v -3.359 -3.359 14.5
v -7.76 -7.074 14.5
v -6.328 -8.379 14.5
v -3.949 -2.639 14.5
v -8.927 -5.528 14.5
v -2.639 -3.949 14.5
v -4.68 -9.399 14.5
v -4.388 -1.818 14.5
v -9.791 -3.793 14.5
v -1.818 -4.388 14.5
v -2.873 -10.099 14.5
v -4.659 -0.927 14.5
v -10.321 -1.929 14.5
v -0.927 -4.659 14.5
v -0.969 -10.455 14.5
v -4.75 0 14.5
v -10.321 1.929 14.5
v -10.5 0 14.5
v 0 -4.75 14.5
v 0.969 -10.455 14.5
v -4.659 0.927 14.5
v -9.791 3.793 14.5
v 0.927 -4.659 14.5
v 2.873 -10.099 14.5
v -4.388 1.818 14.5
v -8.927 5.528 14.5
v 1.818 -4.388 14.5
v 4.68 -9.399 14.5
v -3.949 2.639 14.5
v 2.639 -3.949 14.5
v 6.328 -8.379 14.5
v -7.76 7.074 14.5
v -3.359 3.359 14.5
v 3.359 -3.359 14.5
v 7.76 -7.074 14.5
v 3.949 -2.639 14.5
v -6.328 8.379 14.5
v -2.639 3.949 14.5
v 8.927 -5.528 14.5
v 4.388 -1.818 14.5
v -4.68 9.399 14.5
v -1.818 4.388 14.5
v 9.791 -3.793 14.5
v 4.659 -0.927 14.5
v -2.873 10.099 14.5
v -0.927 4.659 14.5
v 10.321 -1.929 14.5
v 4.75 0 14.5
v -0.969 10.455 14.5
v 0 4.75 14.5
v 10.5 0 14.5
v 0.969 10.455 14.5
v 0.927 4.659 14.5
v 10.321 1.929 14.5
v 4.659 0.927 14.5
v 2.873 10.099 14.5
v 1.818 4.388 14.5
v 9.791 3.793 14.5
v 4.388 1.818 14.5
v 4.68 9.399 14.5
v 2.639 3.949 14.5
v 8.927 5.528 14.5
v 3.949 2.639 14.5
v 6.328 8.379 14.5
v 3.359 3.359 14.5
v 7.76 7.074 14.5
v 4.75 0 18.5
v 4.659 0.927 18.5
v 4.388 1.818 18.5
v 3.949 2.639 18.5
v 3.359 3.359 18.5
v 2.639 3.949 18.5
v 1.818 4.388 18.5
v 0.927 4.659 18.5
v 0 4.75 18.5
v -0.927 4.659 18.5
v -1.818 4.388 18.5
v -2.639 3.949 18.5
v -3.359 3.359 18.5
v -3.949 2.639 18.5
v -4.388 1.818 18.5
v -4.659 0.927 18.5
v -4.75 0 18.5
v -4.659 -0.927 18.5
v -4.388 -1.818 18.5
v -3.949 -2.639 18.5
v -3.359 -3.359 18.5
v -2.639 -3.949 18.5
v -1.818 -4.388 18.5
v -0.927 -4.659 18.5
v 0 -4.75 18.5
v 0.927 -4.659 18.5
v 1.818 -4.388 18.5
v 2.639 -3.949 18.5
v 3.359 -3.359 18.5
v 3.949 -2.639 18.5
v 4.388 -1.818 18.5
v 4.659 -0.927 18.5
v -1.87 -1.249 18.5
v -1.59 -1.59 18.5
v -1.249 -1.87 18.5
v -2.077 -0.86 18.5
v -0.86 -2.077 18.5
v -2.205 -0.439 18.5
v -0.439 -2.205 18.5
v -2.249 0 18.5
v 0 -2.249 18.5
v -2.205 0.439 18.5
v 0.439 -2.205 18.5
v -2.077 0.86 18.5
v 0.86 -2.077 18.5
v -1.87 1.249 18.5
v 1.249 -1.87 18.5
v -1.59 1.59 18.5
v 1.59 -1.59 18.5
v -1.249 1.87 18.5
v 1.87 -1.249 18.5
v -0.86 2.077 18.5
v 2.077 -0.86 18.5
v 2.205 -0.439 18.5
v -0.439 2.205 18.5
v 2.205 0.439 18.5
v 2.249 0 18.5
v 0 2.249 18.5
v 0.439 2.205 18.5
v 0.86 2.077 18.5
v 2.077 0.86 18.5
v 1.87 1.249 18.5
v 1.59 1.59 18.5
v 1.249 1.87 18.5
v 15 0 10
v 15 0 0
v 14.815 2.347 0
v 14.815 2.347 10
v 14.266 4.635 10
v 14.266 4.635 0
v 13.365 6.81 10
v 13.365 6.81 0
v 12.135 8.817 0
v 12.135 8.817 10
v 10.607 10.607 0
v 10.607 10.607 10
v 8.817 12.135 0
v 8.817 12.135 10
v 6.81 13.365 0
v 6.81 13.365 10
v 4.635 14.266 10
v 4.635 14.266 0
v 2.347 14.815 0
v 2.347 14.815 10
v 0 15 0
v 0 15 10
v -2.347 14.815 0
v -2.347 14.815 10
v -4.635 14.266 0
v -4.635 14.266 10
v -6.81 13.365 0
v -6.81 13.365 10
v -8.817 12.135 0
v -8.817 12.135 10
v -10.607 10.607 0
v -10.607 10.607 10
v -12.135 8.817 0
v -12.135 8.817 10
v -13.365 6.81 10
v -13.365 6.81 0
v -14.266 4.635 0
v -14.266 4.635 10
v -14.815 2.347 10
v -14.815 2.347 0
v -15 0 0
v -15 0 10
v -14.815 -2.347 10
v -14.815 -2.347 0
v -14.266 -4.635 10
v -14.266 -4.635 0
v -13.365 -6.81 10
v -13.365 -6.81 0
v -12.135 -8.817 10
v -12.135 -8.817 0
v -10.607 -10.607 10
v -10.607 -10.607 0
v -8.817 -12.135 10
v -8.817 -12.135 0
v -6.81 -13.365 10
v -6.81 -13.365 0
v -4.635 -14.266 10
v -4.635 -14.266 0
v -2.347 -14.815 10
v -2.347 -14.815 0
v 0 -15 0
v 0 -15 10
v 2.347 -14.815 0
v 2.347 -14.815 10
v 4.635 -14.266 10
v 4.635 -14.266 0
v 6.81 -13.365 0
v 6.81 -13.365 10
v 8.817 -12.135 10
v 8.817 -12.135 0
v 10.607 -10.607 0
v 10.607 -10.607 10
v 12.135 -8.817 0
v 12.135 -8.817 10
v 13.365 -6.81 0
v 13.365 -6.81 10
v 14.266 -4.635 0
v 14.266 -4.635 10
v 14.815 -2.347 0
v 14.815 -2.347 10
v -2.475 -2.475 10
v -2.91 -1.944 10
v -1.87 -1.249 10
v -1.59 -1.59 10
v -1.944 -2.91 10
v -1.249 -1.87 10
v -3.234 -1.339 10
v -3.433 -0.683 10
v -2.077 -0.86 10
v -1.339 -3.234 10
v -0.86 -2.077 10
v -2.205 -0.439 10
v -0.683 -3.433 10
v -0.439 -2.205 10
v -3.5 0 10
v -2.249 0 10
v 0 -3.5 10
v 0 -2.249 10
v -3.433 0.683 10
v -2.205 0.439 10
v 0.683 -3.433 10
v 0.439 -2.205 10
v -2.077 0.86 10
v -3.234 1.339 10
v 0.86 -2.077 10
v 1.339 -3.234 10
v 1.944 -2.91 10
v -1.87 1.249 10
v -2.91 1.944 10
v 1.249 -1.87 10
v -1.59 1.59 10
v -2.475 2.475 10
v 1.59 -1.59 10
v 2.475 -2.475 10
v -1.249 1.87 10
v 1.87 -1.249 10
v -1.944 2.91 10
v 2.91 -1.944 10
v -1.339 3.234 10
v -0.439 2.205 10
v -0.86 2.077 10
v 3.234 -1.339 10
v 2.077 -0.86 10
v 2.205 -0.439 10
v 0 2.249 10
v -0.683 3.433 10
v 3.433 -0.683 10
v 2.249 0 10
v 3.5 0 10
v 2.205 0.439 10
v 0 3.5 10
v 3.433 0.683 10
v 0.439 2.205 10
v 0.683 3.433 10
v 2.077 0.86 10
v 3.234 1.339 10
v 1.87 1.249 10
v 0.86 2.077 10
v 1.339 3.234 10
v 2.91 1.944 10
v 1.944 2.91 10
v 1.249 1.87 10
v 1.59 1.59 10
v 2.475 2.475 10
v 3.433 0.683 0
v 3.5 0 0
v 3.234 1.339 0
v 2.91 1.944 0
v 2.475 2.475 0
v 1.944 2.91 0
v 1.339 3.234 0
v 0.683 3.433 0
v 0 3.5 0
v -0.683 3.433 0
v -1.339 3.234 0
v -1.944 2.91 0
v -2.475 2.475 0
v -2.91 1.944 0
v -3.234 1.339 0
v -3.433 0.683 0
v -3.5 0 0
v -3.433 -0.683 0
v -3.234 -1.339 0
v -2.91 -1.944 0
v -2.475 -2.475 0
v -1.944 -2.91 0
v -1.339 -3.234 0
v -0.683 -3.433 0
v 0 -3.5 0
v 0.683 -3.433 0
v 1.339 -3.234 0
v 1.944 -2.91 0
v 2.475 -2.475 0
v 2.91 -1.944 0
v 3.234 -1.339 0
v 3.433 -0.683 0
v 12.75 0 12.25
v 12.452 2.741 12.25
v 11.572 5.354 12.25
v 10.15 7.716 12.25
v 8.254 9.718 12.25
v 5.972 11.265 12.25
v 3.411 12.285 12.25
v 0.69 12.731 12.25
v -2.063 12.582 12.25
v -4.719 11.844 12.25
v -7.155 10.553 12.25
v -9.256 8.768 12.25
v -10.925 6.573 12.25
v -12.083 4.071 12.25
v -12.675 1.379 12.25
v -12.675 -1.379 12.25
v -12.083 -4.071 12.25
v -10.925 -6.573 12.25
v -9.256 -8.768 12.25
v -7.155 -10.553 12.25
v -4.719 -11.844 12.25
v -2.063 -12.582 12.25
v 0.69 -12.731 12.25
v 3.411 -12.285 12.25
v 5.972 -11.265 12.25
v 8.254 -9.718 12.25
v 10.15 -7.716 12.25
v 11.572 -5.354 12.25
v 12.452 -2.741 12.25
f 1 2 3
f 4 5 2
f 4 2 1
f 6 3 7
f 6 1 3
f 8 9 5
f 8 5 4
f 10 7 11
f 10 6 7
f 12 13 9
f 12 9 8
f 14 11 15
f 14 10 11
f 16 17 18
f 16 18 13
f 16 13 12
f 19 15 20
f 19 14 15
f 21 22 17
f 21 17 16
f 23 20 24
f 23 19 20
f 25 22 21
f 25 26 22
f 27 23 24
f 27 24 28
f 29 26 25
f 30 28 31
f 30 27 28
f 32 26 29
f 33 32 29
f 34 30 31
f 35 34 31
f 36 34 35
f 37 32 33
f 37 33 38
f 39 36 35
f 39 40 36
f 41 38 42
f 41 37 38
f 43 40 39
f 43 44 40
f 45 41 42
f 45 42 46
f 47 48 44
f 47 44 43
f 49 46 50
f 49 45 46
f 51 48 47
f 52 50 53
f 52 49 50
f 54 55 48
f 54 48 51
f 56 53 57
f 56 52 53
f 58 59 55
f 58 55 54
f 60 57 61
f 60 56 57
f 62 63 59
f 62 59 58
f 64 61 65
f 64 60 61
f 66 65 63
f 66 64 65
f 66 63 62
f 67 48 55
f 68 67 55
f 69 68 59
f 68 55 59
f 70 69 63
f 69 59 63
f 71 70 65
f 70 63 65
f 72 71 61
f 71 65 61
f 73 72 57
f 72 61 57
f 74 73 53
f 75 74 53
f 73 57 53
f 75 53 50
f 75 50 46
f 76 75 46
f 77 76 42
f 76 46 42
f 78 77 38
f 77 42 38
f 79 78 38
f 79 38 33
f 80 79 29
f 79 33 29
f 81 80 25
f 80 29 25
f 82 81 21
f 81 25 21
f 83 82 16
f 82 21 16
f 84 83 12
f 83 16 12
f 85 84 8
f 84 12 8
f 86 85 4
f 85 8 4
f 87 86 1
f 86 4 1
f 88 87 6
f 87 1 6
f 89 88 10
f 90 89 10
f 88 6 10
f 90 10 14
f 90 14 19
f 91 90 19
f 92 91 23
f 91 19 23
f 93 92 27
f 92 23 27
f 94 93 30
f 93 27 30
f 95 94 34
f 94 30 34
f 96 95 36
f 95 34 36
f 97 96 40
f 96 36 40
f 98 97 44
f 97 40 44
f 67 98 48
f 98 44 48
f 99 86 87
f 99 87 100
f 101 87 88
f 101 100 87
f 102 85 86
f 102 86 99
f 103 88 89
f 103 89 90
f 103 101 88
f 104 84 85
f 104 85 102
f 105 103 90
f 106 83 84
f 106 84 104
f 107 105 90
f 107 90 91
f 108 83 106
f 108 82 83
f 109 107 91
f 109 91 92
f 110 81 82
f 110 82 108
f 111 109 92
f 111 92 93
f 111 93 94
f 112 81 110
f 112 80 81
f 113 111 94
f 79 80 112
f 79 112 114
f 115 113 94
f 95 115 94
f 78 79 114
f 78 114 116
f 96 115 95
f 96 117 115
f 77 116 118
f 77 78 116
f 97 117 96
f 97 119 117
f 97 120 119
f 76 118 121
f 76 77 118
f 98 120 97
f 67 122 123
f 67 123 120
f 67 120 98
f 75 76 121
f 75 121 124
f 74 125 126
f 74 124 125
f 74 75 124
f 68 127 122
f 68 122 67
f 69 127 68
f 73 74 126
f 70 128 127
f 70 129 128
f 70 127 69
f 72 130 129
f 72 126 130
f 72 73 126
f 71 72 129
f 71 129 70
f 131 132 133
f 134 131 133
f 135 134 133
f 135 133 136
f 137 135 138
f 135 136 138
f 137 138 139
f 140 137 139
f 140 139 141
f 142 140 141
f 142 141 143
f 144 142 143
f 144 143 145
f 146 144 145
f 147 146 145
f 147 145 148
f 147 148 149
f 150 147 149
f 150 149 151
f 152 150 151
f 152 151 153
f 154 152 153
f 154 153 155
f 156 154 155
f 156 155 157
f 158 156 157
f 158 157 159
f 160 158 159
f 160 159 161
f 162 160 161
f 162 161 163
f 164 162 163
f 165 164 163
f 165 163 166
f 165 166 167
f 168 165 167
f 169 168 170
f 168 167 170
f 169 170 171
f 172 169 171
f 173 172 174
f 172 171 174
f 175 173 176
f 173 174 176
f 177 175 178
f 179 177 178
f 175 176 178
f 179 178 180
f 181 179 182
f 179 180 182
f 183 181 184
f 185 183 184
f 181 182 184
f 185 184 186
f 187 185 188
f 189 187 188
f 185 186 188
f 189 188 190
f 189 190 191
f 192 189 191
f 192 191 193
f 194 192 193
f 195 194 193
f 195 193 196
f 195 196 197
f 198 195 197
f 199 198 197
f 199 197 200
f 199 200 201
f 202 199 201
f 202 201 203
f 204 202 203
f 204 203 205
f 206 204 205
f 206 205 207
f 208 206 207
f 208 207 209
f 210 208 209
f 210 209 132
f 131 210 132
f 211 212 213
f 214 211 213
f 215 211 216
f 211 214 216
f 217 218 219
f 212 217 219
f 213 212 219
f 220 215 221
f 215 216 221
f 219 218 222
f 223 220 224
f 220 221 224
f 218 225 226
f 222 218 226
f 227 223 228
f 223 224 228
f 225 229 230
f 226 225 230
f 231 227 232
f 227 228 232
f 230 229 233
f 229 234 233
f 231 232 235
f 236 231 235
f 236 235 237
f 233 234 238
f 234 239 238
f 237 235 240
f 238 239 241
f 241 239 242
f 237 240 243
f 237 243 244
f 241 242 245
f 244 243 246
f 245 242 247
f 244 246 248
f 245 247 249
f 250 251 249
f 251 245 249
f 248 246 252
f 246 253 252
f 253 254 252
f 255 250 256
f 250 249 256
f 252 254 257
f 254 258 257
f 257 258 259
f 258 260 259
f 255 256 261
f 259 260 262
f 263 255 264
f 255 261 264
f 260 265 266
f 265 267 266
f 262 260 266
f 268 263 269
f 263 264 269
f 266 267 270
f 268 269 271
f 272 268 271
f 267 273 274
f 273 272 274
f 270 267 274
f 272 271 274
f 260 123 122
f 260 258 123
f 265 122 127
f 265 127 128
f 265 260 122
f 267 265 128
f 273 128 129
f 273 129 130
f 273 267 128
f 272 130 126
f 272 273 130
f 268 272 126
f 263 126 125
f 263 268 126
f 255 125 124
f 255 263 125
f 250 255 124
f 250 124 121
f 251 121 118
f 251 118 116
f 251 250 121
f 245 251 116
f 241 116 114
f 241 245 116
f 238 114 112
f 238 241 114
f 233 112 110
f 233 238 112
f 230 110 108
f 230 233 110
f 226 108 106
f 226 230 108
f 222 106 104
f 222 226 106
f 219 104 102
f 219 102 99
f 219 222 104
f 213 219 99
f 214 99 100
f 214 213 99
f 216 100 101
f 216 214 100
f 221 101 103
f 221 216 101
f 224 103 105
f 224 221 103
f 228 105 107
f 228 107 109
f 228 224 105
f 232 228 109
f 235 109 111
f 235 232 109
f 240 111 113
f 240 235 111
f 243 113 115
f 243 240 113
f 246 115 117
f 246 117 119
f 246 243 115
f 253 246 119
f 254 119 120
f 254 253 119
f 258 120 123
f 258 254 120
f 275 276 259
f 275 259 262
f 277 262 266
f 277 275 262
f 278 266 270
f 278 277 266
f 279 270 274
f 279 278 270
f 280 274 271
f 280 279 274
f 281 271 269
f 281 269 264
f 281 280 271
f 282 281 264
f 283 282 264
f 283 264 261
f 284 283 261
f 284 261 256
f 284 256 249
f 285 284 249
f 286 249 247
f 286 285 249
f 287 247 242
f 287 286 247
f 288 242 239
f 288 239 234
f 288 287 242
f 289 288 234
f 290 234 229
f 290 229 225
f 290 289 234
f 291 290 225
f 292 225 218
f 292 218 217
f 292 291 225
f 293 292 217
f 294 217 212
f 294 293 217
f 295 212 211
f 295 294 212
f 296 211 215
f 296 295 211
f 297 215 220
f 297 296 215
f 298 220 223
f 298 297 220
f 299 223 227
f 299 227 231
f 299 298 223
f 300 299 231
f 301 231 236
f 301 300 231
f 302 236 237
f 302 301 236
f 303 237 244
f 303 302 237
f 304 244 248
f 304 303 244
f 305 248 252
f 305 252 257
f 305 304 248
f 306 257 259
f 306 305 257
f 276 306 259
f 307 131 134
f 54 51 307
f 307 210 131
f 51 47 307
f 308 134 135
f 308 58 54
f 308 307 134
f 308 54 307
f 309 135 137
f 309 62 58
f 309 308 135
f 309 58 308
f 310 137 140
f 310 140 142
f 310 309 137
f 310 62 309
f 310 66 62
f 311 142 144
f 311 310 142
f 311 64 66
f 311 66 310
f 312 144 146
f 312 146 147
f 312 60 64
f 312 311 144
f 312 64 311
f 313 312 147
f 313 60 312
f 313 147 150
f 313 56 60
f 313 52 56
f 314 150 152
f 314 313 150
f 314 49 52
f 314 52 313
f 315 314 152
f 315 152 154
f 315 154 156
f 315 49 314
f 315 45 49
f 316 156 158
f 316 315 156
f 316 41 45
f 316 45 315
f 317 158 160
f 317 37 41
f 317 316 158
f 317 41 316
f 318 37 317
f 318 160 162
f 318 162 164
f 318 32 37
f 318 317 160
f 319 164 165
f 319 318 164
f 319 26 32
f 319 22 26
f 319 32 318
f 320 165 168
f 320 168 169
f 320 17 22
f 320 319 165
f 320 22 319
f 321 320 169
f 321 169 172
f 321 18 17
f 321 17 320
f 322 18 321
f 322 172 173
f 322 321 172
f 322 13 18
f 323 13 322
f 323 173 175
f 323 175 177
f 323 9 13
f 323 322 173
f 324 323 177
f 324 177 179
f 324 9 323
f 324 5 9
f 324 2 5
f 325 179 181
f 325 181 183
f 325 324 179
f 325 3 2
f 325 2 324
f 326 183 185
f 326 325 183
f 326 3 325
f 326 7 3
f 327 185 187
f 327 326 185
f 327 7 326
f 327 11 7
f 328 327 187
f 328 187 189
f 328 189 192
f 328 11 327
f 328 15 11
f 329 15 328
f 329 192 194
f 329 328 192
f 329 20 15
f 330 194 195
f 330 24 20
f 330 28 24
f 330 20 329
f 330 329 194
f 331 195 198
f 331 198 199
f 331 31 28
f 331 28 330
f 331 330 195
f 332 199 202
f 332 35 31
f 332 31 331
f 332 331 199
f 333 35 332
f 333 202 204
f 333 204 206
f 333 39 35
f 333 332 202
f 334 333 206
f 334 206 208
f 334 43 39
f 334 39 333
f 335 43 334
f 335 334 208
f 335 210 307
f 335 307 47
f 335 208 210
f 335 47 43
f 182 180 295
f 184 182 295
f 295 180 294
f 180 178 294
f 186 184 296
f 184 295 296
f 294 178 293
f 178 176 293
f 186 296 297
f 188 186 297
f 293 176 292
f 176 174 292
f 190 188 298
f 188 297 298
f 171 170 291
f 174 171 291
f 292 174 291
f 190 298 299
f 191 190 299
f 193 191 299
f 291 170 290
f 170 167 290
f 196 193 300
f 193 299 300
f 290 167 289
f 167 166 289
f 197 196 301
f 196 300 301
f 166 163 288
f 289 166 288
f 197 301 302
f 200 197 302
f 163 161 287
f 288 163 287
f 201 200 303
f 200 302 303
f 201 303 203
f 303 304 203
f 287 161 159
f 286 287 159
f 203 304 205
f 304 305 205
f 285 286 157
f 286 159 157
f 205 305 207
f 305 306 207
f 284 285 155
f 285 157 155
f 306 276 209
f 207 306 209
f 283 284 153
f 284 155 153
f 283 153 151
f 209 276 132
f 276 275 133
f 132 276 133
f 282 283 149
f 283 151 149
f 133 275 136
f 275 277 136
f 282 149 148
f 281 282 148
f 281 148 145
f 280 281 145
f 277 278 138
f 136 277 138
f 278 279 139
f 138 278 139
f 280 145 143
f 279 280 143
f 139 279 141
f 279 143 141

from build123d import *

# Parameters (mm, degrees)
F0_R      = 15
F1_DEPTH  = 10
F2_R      = 15
F3_DEPTH  = 4.5
F4_SIZE2  = 4.5
F4_SIZE   = 4.5
F5_R      = 2.2485105192
F6_DEPTH  = 4.5
F7_R      = 3.5
F8_DEPTH  = 10
F9_R      = 4.75
F9_R_2    = 2.2485105192
F10_DEPTH = 4


with BuildPart() as f1:
    # F0 (on Top) → F1 (new body)
    with BuildSketch(Plane.XY):
        Circle(F0_R)
    extrude(amount=F1_DEPTH)

    # F2 (on face) → F3 (join)
    with BuildSketch(Plane.XY.offset(10)):
        Circle(F2_R)
    extrude(amount=F3_DEPTH)

    # F4
    f4_edges = [f1.edges().sort_by_distance(p)[0] for p in [
        (-15, 0, 14.5),
    ]]
    chamfer(f4_edges, length=F4_SIZE, length2=F4_SIZE2)

    # F5 (on face) → F6 (cut)
    with BuildSketch(Plane.XY.offset(14.5)):
        Circle(F5_R)
    extrude(amount=-F6_DEPTH, mode=Mode.SUBTRACT)

    # F7 (on face) → F8 (cut)
    with BuildSketch(Plane.XY):
        Circle(F7_R)
    extrude(amount=F8_DEPTH, mode=Mode.SUBTRACT)

    # F9 (on face) → F10 (join)
    with BuildSketch(Plane.XY.offset(14.5)):
        Circle(F9_R)
        Circle(F9_R_2, mode=Mode.SUBTRACT)
    extrude(amount=F10_DEPTH)


solid = f1.part
